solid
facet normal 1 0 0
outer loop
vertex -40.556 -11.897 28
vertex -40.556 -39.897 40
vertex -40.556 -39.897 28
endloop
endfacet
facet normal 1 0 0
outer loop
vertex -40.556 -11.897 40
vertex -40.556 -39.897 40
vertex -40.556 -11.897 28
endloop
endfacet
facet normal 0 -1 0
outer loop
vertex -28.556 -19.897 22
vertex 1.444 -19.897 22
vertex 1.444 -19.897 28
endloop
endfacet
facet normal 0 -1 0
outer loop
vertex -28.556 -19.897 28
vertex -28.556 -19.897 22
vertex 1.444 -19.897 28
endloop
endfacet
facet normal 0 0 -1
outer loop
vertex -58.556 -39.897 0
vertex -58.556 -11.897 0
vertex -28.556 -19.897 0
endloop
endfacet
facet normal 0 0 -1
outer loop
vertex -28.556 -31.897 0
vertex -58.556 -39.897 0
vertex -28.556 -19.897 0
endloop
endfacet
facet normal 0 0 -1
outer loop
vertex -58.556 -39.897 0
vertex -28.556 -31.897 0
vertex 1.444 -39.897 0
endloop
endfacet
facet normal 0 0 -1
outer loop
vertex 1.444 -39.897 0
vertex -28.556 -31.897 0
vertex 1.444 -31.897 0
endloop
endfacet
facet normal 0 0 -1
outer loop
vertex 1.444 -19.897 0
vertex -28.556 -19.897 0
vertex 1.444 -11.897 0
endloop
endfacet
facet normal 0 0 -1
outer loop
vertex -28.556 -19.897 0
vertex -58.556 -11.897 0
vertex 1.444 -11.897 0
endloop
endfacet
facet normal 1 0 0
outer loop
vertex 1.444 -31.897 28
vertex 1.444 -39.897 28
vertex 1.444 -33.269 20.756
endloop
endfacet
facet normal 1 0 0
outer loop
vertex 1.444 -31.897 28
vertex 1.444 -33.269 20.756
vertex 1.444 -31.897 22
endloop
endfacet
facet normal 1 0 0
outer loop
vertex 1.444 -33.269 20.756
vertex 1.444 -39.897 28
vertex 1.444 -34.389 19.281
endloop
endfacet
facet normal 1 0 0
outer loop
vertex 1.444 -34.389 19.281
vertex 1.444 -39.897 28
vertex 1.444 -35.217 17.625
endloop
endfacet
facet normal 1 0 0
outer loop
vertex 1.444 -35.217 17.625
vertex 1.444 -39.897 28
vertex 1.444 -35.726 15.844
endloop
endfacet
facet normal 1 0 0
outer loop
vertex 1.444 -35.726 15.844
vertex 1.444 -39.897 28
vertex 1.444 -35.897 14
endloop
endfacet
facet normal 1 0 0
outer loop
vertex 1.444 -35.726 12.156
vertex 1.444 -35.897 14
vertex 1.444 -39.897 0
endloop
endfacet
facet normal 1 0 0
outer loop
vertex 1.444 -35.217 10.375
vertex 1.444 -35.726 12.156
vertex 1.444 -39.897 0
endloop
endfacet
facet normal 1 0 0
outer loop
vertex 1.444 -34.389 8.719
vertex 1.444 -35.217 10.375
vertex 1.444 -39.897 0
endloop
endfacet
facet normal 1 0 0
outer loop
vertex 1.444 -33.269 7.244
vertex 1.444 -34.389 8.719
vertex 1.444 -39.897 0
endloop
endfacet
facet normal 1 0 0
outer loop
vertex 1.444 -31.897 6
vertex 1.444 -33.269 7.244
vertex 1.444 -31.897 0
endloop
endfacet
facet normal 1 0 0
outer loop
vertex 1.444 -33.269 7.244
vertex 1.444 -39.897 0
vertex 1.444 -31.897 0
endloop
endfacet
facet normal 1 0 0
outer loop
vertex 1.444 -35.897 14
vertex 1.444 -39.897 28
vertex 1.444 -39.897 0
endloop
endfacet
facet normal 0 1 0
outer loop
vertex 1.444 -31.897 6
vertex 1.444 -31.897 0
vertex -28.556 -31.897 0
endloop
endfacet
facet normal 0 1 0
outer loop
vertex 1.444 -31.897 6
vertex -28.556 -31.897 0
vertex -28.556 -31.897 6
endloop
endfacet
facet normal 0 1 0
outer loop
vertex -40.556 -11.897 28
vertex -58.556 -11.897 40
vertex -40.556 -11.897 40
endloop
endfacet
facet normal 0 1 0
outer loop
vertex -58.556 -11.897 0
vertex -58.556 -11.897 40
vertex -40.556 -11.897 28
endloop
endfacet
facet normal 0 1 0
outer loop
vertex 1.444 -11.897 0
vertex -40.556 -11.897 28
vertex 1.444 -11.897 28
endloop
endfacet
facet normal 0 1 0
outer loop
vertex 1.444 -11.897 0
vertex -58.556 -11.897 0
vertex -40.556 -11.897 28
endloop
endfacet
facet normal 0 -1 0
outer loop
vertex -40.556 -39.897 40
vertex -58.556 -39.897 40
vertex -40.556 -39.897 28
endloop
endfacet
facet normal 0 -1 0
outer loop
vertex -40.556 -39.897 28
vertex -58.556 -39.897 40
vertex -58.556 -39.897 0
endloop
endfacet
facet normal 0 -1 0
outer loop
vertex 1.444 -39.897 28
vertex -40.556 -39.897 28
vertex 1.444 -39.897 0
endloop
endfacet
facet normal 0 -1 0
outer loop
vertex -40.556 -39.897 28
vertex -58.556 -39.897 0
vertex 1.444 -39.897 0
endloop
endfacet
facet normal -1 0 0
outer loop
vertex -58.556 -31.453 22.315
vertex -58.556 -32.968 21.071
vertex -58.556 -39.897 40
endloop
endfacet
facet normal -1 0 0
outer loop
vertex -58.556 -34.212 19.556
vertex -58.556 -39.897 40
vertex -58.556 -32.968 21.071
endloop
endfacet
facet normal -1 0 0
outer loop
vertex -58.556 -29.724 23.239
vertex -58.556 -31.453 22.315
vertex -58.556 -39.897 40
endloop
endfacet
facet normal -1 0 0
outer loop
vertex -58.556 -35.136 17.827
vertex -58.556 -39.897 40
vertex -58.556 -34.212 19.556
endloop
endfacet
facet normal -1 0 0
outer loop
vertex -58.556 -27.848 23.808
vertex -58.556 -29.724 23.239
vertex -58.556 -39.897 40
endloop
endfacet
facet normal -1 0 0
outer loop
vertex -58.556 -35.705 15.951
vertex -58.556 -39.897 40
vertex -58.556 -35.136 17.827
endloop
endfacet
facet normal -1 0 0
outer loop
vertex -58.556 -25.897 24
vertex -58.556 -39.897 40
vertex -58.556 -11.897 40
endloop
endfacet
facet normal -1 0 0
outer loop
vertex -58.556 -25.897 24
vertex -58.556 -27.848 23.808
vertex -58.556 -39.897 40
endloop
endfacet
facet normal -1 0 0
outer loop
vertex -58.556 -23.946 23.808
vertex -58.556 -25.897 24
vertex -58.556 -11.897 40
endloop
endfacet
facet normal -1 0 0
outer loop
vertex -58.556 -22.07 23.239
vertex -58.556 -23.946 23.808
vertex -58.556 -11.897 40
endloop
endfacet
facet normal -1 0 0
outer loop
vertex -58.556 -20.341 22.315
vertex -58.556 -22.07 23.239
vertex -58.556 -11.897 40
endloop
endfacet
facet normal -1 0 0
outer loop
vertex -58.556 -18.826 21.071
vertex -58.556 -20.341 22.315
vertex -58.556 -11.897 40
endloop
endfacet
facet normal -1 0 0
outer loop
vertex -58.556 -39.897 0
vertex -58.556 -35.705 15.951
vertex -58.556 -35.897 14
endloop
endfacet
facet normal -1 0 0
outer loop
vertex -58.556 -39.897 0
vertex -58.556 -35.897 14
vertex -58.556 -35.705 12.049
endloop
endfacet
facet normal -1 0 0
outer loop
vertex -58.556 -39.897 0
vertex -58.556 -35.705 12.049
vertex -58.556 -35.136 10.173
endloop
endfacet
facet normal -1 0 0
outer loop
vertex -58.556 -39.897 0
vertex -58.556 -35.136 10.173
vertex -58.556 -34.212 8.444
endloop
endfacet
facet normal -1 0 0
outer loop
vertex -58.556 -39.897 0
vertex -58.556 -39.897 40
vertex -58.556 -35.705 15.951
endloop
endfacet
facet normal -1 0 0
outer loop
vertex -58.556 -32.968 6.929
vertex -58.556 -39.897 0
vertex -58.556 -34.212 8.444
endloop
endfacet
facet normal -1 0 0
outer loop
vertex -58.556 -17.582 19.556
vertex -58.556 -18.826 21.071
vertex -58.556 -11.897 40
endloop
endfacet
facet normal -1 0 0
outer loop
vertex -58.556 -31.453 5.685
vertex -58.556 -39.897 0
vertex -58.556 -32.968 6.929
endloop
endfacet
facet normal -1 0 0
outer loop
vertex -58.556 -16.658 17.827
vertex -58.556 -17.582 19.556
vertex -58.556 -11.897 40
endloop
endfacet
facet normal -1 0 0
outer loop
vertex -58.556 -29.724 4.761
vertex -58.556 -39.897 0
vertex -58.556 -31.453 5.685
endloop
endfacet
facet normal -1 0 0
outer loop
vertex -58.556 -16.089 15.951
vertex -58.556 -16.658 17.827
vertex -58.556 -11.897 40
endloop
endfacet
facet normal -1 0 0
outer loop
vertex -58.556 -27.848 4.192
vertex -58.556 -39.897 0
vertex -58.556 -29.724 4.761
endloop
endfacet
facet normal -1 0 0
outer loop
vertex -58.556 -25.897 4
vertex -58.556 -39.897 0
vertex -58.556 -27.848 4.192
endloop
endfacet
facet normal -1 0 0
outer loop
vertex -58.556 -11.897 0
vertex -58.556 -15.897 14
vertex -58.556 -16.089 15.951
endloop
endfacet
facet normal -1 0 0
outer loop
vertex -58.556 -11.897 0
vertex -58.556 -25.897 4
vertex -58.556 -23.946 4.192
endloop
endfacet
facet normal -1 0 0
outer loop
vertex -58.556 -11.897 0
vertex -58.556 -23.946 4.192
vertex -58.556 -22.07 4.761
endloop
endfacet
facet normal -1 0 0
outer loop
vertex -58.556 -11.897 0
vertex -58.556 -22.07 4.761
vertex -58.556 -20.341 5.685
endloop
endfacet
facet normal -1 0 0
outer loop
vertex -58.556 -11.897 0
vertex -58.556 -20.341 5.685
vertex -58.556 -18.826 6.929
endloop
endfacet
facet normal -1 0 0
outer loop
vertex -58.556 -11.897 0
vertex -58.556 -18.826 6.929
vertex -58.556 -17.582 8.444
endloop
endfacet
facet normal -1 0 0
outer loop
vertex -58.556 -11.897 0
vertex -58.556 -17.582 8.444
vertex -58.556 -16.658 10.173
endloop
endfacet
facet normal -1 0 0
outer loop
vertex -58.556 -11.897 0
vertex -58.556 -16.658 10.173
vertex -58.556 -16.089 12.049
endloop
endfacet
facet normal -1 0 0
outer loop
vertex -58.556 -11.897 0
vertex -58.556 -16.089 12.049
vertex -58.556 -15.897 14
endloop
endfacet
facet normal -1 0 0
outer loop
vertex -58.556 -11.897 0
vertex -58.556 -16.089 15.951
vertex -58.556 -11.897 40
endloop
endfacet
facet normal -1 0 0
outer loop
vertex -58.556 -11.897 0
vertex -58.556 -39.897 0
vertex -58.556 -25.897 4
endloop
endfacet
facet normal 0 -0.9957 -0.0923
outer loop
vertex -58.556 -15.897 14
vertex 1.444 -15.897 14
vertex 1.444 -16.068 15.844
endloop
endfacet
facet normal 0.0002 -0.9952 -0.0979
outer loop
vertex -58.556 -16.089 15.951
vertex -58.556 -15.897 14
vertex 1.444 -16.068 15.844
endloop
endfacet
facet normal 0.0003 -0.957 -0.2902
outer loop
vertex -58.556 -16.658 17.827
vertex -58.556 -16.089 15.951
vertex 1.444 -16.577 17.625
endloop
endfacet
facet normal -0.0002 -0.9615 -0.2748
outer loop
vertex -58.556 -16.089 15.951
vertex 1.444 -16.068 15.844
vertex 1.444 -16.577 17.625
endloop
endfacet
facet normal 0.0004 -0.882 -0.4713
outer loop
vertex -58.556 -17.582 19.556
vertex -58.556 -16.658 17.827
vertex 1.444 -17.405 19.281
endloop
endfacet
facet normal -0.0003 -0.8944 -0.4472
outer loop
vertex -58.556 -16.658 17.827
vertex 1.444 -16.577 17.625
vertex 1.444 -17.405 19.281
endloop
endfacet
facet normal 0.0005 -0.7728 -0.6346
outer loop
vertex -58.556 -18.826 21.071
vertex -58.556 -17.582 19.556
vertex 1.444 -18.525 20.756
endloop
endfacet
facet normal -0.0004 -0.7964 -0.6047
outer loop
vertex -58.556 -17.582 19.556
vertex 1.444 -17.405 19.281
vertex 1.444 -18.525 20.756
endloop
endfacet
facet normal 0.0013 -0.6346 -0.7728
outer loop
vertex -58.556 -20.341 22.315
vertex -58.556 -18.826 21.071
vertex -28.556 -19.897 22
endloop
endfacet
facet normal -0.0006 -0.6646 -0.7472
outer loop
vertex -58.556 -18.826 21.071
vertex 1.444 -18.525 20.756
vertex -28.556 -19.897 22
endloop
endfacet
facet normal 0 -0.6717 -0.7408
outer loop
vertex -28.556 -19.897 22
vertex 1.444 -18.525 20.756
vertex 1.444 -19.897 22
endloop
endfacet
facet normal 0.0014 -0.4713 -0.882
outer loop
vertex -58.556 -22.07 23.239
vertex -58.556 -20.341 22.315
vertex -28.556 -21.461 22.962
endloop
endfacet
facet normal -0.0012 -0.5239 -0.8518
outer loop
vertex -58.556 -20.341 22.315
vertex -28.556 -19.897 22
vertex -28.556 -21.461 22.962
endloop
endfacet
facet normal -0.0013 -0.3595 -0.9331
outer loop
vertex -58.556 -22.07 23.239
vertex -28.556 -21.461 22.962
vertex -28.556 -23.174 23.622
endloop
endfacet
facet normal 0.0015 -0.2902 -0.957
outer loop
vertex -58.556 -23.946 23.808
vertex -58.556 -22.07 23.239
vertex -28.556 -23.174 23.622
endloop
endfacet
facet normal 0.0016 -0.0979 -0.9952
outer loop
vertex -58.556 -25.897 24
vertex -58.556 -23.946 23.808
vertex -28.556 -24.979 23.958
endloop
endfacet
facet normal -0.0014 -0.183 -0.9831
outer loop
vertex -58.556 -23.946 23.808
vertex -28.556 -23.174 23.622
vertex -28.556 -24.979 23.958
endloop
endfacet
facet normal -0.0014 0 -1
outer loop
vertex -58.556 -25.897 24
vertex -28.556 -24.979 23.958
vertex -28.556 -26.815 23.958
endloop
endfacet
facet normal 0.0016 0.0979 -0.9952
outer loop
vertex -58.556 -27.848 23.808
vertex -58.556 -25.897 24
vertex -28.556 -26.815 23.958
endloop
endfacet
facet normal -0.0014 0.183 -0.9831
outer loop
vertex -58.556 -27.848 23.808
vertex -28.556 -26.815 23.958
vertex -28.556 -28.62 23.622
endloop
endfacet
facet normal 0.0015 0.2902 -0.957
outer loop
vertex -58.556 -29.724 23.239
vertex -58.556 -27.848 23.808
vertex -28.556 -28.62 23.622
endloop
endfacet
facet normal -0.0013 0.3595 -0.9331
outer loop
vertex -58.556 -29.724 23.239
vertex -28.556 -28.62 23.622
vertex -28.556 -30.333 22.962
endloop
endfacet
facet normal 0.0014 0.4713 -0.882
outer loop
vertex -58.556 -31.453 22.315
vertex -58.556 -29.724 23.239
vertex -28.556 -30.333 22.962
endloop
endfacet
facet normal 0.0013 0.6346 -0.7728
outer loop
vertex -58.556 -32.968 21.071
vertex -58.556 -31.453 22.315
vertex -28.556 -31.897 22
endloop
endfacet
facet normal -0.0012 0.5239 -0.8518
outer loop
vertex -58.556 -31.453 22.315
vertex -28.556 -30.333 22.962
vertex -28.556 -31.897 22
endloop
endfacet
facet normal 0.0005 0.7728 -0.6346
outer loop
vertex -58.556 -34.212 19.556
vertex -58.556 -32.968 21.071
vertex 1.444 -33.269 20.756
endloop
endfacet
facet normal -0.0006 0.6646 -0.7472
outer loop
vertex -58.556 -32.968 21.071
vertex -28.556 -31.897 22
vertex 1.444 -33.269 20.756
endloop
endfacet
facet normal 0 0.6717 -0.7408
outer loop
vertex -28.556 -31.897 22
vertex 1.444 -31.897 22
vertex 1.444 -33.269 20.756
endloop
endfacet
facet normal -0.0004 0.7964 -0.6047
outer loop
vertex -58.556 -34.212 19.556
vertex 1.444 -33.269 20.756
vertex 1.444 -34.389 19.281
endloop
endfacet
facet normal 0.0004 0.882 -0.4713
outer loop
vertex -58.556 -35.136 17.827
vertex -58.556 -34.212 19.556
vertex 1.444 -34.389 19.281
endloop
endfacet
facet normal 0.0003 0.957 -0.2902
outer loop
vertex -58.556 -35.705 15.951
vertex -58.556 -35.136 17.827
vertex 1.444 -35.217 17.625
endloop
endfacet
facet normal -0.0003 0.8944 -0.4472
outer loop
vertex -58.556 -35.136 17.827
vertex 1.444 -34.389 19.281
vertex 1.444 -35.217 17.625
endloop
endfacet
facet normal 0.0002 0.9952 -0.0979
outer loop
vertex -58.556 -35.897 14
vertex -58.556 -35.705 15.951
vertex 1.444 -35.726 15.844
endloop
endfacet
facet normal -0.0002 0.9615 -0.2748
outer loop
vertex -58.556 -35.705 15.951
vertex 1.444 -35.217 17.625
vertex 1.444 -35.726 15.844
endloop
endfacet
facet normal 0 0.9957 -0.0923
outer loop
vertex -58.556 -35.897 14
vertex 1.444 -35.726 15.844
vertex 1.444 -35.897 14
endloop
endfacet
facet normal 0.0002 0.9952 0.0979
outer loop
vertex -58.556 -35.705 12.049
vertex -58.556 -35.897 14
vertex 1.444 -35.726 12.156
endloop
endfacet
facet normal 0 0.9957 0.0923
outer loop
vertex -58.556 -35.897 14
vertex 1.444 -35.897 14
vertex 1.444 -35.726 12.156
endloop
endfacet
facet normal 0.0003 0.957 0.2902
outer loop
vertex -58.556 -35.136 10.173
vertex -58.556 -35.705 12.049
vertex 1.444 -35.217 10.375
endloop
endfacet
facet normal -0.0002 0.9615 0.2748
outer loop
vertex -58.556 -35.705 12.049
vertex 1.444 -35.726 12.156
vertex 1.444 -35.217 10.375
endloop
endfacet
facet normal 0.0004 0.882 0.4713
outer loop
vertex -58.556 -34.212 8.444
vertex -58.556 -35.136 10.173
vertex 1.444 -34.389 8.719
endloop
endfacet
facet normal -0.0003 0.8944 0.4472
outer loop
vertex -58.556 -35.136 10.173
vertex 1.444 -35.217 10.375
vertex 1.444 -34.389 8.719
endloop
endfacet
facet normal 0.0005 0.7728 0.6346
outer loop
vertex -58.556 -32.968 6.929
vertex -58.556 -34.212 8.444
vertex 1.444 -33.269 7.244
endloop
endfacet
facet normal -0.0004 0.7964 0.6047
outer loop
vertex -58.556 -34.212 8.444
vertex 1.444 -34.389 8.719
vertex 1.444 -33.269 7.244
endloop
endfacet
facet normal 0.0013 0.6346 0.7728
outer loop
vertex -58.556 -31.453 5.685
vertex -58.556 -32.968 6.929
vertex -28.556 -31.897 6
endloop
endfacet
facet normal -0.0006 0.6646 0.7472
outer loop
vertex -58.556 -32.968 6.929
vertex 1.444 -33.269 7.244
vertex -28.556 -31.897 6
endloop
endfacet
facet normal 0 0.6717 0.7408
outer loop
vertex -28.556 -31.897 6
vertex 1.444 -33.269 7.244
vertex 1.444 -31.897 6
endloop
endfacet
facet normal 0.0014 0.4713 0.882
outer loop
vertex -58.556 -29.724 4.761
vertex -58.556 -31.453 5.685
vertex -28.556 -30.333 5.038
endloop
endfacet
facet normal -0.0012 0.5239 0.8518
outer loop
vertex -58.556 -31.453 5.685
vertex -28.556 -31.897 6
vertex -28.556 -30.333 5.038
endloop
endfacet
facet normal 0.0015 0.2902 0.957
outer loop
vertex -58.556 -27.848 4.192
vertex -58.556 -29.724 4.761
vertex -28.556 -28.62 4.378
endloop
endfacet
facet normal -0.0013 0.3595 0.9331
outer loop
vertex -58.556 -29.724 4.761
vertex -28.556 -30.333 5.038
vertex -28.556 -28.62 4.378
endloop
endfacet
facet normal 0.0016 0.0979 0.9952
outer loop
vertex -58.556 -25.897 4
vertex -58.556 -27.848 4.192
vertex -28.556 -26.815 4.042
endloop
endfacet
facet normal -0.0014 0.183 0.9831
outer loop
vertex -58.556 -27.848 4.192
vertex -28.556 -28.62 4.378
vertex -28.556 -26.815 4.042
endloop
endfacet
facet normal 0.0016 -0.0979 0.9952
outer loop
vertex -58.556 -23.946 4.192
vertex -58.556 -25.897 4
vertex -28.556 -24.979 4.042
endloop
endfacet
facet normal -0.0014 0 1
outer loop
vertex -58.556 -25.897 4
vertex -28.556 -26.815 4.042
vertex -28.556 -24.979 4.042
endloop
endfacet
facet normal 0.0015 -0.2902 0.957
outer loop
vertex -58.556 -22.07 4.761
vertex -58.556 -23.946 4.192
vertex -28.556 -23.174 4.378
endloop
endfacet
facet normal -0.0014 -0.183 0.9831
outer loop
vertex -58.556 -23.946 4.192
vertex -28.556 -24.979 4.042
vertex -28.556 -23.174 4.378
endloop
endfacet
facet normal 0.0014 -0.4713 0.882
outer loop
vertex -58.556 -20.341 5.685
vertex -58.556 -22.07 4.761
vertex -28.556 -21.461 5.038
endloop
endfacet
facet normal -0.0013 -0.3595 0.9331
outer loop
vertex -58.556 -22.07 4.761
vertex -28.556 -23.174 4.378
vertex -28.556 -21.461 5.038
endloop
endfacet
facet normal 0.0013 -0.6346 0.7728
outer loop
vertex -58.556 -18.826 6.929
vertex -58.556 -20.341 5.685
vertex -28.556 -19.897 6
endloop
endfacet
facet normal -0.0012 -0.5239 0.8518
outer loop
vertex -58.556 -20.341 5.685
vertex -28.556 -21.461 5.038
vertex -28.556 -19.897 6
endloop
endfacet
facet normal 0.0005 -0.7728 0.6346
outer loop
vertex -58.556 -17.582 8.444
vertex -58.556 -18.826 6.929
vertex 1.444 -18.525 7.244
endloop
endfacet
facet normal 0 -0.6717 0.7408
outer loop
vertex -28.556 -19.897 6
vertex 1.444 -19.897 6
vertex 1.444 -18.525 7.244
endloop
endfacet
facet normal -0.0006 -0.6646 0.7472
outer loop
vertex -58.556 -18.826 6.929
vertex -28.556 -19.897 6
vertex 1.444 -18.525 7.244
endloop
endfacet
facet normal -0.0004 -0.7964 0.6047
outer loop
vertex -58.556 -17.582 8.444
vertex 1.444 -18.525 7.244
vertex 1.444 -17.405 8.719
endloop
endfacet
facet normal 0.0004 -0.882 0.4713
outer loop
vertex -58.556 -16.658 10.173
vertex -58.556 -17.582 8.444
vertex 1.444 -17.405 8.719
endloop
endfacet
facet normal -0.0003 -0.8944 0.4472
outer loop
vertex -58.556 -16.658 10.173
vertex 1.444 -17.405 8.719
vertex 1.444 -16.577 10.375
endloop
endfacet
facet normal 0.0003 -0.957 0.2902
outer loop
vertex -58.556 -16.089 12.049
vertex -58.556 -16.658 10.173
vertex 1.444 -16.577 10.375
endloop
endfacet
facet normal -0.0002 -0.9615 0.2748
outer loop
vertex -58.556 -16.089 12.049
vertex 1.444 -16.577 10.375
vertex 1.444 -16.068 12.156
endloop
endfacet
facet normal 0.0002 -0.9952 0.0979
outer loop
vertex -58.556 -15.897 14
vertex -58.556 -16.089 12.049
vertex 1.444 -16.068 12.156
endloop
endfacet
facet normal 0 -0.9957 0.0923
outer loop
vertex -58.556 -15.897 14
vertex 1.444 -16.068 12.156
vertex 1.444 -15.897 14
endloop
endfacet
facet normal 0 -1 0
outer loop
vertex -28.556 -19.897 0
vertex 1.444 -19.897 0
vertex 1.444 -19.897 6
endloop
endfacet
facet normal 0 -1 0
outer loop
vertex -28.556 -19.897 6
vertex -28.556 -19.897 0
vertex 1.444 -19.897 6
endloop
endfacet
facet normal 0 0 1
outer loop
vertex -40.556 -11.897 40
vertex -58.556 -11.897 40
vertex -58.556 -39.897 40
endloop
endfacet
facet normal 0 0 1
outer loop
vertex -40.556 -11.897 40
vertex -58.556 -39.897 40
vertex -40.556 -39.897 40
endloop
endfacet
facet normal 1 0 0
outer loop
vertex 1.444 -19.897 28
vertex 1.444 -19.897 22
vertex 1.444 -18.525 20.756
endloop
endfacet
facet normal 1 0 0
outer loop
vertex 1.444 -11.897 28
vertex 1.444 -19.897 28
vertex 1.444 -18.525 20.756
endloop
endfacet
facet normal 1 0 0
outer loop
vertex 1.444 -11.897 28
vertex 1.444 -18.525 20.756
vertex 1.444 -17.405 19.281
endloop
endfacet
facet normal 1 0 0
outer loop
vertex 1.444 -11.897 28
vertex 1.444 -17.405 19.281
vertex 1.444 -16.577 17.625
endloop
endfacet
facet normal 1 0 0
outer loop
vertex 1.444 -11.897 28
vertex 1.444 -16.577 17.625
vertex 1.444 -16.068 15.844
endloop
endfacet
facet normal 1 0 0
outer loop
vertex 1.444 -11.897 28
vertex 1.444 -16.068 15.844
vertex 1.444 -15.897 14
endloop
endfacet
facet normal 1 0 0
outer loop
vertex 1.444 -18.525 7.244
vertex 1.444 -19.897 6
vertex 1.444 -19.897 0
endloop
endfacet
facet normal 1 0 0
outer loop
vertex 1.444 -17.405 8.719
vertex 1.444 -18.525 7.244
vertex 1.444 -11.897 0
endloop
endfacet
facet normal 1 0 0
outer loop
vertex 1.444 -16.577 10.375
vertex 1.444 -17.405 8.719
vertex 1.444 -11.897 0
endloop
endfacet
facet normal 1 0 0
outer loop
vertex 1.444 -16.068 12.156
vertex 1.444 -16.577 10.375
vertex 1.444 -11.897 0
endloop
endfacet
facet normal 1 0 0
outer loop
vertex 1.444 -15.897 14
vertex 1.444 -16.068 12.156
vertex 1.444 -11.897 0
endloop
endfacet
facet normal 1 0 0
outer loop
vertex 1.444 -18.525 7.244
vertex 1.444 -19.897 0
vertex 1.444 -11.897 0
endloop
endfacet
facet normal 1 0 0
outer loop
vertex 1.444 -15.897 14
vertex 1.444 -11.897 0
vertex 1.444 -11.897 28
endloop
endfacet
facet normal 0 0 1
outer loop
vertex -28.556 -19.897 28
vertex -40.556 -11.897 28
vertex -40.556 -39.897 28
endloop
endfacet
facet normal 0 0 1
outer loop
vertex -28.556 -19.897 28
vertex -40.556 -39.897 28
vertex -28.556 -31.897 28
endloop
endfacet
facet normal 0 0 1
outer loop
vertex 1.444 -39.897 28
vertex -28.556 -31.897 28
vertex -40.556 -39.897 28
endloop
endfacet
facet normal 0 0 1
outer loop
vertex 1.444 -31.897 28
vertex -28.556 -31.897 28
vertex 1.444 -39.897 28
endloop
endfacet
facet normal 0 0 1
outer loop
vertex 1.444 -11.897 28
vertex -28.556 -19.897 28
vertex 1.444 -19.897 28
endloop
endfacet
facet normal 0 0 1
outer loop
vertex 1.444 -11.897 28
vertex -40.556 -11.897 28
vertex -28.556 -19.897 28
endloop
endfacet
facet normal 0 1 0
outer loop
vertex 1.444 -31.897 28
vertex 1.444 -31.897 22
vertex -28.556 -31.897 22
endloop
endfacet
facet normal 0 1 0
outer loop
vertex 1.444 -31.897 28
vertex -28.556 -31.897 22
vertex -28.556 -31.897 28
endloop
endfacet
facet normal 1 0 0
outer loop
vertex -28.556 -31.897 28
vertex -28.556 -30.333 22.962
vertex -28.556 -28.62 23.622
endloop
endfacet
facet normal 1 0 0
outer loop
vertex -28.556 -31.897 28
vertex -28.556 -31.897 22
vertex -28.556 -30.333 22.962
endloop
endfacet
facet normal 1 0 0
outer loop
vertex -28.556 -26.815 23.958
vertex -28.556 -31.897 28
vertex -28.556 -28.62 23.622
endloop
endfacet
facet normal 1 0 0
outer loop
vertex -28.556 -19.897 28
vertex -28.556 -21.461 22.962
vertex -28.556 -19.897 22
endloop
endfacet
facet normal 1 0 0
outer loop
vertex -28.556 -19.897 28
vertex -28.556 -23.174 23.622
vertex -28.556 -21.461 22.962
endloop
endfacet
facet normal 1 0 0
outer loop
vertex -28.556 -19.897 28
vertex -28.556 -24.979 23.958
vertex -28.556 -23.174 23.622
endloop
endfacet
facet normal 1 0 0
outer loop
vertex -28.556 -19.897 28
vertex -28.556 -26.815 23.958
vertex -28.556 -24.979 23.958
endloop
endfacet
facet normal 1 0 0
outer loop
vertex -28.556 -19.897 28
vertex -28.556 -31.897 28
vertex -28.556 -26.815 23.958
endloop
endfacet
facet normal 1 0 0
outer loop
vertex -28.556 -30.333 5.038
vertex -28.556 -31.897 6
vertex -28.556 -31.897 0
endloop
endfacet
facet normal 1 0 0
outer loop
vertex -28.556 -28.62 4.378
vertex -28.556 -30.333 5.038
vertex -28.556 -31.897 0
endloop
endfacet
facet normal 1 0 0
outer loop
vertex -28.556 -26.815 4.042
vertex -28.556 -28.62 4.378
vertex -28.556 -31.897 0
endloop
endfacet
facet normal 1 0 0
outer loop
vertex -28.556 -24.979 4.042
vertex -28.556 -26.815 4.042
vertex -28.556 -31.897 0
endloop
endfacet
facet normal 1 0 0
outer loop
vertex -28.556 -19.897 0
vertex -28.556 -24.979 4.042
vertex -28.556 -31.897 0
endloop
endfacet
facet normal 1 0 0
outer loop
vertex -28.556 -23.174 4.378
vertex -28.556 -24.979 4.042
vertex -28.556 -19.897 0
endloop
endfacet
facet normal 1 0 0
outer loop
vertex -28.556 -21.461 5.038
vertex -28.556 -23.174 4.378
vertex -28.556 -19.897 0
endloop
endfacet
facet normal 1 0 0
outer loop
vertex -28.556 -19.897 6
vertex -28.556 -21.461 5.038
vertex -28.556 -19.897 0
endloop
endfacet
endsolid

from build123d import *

# Parameters (mm, degrees)
F0_W     = 60
F0_H     = 28
F1_DEPTH = 40
F2_W     = 42
F2_H     = 28
F3_DEPTH = 12
F4_R     = 10
F5_DEPTH = 60
F6_W     = 12
F6_H     = 28
F7_DEPTH = 30


with BuildPart() as f1:
    # F0 (on Top) → F1 (new body)
    with BuildSketch(Plane.XY):
        with Locations((-28.556031, -25.896984)):
            Rectangle(F0_W, F0_H)
    extrude(amount=F1_DEPTH)

    # F2 (on face) → F3 (cut)
    with BuildSketch(Plane.XY.offset(40)):
        with Locations((-19.556031, -25.896984)):
            Rectangle(F2_W, F2_H)
    extrude(amount=-F3_DEPTH, mode=Mode.SUBTRACT)

    # F4 (on face) → F5 (cut)
    with BuildSketch(Plane.YZ.offset(1.443969)):
        with Locations((-25.896984, 14)):
            Circle(F4_R)
    extrude(amount=-F5_DEPTH, mode=Mode.SUBTRACT)

    # F6 (on face) → F7 (cut)
    with BuildSketch(Plane.YZ.offset(1.443969)):
        with Locations((-25.896984, 14)):
            Rectangle(F6_W, F6_H)
    extrude(amount=-F7_DEPTH, mode=Mode.SUBTRACT)


solid = f1.part
